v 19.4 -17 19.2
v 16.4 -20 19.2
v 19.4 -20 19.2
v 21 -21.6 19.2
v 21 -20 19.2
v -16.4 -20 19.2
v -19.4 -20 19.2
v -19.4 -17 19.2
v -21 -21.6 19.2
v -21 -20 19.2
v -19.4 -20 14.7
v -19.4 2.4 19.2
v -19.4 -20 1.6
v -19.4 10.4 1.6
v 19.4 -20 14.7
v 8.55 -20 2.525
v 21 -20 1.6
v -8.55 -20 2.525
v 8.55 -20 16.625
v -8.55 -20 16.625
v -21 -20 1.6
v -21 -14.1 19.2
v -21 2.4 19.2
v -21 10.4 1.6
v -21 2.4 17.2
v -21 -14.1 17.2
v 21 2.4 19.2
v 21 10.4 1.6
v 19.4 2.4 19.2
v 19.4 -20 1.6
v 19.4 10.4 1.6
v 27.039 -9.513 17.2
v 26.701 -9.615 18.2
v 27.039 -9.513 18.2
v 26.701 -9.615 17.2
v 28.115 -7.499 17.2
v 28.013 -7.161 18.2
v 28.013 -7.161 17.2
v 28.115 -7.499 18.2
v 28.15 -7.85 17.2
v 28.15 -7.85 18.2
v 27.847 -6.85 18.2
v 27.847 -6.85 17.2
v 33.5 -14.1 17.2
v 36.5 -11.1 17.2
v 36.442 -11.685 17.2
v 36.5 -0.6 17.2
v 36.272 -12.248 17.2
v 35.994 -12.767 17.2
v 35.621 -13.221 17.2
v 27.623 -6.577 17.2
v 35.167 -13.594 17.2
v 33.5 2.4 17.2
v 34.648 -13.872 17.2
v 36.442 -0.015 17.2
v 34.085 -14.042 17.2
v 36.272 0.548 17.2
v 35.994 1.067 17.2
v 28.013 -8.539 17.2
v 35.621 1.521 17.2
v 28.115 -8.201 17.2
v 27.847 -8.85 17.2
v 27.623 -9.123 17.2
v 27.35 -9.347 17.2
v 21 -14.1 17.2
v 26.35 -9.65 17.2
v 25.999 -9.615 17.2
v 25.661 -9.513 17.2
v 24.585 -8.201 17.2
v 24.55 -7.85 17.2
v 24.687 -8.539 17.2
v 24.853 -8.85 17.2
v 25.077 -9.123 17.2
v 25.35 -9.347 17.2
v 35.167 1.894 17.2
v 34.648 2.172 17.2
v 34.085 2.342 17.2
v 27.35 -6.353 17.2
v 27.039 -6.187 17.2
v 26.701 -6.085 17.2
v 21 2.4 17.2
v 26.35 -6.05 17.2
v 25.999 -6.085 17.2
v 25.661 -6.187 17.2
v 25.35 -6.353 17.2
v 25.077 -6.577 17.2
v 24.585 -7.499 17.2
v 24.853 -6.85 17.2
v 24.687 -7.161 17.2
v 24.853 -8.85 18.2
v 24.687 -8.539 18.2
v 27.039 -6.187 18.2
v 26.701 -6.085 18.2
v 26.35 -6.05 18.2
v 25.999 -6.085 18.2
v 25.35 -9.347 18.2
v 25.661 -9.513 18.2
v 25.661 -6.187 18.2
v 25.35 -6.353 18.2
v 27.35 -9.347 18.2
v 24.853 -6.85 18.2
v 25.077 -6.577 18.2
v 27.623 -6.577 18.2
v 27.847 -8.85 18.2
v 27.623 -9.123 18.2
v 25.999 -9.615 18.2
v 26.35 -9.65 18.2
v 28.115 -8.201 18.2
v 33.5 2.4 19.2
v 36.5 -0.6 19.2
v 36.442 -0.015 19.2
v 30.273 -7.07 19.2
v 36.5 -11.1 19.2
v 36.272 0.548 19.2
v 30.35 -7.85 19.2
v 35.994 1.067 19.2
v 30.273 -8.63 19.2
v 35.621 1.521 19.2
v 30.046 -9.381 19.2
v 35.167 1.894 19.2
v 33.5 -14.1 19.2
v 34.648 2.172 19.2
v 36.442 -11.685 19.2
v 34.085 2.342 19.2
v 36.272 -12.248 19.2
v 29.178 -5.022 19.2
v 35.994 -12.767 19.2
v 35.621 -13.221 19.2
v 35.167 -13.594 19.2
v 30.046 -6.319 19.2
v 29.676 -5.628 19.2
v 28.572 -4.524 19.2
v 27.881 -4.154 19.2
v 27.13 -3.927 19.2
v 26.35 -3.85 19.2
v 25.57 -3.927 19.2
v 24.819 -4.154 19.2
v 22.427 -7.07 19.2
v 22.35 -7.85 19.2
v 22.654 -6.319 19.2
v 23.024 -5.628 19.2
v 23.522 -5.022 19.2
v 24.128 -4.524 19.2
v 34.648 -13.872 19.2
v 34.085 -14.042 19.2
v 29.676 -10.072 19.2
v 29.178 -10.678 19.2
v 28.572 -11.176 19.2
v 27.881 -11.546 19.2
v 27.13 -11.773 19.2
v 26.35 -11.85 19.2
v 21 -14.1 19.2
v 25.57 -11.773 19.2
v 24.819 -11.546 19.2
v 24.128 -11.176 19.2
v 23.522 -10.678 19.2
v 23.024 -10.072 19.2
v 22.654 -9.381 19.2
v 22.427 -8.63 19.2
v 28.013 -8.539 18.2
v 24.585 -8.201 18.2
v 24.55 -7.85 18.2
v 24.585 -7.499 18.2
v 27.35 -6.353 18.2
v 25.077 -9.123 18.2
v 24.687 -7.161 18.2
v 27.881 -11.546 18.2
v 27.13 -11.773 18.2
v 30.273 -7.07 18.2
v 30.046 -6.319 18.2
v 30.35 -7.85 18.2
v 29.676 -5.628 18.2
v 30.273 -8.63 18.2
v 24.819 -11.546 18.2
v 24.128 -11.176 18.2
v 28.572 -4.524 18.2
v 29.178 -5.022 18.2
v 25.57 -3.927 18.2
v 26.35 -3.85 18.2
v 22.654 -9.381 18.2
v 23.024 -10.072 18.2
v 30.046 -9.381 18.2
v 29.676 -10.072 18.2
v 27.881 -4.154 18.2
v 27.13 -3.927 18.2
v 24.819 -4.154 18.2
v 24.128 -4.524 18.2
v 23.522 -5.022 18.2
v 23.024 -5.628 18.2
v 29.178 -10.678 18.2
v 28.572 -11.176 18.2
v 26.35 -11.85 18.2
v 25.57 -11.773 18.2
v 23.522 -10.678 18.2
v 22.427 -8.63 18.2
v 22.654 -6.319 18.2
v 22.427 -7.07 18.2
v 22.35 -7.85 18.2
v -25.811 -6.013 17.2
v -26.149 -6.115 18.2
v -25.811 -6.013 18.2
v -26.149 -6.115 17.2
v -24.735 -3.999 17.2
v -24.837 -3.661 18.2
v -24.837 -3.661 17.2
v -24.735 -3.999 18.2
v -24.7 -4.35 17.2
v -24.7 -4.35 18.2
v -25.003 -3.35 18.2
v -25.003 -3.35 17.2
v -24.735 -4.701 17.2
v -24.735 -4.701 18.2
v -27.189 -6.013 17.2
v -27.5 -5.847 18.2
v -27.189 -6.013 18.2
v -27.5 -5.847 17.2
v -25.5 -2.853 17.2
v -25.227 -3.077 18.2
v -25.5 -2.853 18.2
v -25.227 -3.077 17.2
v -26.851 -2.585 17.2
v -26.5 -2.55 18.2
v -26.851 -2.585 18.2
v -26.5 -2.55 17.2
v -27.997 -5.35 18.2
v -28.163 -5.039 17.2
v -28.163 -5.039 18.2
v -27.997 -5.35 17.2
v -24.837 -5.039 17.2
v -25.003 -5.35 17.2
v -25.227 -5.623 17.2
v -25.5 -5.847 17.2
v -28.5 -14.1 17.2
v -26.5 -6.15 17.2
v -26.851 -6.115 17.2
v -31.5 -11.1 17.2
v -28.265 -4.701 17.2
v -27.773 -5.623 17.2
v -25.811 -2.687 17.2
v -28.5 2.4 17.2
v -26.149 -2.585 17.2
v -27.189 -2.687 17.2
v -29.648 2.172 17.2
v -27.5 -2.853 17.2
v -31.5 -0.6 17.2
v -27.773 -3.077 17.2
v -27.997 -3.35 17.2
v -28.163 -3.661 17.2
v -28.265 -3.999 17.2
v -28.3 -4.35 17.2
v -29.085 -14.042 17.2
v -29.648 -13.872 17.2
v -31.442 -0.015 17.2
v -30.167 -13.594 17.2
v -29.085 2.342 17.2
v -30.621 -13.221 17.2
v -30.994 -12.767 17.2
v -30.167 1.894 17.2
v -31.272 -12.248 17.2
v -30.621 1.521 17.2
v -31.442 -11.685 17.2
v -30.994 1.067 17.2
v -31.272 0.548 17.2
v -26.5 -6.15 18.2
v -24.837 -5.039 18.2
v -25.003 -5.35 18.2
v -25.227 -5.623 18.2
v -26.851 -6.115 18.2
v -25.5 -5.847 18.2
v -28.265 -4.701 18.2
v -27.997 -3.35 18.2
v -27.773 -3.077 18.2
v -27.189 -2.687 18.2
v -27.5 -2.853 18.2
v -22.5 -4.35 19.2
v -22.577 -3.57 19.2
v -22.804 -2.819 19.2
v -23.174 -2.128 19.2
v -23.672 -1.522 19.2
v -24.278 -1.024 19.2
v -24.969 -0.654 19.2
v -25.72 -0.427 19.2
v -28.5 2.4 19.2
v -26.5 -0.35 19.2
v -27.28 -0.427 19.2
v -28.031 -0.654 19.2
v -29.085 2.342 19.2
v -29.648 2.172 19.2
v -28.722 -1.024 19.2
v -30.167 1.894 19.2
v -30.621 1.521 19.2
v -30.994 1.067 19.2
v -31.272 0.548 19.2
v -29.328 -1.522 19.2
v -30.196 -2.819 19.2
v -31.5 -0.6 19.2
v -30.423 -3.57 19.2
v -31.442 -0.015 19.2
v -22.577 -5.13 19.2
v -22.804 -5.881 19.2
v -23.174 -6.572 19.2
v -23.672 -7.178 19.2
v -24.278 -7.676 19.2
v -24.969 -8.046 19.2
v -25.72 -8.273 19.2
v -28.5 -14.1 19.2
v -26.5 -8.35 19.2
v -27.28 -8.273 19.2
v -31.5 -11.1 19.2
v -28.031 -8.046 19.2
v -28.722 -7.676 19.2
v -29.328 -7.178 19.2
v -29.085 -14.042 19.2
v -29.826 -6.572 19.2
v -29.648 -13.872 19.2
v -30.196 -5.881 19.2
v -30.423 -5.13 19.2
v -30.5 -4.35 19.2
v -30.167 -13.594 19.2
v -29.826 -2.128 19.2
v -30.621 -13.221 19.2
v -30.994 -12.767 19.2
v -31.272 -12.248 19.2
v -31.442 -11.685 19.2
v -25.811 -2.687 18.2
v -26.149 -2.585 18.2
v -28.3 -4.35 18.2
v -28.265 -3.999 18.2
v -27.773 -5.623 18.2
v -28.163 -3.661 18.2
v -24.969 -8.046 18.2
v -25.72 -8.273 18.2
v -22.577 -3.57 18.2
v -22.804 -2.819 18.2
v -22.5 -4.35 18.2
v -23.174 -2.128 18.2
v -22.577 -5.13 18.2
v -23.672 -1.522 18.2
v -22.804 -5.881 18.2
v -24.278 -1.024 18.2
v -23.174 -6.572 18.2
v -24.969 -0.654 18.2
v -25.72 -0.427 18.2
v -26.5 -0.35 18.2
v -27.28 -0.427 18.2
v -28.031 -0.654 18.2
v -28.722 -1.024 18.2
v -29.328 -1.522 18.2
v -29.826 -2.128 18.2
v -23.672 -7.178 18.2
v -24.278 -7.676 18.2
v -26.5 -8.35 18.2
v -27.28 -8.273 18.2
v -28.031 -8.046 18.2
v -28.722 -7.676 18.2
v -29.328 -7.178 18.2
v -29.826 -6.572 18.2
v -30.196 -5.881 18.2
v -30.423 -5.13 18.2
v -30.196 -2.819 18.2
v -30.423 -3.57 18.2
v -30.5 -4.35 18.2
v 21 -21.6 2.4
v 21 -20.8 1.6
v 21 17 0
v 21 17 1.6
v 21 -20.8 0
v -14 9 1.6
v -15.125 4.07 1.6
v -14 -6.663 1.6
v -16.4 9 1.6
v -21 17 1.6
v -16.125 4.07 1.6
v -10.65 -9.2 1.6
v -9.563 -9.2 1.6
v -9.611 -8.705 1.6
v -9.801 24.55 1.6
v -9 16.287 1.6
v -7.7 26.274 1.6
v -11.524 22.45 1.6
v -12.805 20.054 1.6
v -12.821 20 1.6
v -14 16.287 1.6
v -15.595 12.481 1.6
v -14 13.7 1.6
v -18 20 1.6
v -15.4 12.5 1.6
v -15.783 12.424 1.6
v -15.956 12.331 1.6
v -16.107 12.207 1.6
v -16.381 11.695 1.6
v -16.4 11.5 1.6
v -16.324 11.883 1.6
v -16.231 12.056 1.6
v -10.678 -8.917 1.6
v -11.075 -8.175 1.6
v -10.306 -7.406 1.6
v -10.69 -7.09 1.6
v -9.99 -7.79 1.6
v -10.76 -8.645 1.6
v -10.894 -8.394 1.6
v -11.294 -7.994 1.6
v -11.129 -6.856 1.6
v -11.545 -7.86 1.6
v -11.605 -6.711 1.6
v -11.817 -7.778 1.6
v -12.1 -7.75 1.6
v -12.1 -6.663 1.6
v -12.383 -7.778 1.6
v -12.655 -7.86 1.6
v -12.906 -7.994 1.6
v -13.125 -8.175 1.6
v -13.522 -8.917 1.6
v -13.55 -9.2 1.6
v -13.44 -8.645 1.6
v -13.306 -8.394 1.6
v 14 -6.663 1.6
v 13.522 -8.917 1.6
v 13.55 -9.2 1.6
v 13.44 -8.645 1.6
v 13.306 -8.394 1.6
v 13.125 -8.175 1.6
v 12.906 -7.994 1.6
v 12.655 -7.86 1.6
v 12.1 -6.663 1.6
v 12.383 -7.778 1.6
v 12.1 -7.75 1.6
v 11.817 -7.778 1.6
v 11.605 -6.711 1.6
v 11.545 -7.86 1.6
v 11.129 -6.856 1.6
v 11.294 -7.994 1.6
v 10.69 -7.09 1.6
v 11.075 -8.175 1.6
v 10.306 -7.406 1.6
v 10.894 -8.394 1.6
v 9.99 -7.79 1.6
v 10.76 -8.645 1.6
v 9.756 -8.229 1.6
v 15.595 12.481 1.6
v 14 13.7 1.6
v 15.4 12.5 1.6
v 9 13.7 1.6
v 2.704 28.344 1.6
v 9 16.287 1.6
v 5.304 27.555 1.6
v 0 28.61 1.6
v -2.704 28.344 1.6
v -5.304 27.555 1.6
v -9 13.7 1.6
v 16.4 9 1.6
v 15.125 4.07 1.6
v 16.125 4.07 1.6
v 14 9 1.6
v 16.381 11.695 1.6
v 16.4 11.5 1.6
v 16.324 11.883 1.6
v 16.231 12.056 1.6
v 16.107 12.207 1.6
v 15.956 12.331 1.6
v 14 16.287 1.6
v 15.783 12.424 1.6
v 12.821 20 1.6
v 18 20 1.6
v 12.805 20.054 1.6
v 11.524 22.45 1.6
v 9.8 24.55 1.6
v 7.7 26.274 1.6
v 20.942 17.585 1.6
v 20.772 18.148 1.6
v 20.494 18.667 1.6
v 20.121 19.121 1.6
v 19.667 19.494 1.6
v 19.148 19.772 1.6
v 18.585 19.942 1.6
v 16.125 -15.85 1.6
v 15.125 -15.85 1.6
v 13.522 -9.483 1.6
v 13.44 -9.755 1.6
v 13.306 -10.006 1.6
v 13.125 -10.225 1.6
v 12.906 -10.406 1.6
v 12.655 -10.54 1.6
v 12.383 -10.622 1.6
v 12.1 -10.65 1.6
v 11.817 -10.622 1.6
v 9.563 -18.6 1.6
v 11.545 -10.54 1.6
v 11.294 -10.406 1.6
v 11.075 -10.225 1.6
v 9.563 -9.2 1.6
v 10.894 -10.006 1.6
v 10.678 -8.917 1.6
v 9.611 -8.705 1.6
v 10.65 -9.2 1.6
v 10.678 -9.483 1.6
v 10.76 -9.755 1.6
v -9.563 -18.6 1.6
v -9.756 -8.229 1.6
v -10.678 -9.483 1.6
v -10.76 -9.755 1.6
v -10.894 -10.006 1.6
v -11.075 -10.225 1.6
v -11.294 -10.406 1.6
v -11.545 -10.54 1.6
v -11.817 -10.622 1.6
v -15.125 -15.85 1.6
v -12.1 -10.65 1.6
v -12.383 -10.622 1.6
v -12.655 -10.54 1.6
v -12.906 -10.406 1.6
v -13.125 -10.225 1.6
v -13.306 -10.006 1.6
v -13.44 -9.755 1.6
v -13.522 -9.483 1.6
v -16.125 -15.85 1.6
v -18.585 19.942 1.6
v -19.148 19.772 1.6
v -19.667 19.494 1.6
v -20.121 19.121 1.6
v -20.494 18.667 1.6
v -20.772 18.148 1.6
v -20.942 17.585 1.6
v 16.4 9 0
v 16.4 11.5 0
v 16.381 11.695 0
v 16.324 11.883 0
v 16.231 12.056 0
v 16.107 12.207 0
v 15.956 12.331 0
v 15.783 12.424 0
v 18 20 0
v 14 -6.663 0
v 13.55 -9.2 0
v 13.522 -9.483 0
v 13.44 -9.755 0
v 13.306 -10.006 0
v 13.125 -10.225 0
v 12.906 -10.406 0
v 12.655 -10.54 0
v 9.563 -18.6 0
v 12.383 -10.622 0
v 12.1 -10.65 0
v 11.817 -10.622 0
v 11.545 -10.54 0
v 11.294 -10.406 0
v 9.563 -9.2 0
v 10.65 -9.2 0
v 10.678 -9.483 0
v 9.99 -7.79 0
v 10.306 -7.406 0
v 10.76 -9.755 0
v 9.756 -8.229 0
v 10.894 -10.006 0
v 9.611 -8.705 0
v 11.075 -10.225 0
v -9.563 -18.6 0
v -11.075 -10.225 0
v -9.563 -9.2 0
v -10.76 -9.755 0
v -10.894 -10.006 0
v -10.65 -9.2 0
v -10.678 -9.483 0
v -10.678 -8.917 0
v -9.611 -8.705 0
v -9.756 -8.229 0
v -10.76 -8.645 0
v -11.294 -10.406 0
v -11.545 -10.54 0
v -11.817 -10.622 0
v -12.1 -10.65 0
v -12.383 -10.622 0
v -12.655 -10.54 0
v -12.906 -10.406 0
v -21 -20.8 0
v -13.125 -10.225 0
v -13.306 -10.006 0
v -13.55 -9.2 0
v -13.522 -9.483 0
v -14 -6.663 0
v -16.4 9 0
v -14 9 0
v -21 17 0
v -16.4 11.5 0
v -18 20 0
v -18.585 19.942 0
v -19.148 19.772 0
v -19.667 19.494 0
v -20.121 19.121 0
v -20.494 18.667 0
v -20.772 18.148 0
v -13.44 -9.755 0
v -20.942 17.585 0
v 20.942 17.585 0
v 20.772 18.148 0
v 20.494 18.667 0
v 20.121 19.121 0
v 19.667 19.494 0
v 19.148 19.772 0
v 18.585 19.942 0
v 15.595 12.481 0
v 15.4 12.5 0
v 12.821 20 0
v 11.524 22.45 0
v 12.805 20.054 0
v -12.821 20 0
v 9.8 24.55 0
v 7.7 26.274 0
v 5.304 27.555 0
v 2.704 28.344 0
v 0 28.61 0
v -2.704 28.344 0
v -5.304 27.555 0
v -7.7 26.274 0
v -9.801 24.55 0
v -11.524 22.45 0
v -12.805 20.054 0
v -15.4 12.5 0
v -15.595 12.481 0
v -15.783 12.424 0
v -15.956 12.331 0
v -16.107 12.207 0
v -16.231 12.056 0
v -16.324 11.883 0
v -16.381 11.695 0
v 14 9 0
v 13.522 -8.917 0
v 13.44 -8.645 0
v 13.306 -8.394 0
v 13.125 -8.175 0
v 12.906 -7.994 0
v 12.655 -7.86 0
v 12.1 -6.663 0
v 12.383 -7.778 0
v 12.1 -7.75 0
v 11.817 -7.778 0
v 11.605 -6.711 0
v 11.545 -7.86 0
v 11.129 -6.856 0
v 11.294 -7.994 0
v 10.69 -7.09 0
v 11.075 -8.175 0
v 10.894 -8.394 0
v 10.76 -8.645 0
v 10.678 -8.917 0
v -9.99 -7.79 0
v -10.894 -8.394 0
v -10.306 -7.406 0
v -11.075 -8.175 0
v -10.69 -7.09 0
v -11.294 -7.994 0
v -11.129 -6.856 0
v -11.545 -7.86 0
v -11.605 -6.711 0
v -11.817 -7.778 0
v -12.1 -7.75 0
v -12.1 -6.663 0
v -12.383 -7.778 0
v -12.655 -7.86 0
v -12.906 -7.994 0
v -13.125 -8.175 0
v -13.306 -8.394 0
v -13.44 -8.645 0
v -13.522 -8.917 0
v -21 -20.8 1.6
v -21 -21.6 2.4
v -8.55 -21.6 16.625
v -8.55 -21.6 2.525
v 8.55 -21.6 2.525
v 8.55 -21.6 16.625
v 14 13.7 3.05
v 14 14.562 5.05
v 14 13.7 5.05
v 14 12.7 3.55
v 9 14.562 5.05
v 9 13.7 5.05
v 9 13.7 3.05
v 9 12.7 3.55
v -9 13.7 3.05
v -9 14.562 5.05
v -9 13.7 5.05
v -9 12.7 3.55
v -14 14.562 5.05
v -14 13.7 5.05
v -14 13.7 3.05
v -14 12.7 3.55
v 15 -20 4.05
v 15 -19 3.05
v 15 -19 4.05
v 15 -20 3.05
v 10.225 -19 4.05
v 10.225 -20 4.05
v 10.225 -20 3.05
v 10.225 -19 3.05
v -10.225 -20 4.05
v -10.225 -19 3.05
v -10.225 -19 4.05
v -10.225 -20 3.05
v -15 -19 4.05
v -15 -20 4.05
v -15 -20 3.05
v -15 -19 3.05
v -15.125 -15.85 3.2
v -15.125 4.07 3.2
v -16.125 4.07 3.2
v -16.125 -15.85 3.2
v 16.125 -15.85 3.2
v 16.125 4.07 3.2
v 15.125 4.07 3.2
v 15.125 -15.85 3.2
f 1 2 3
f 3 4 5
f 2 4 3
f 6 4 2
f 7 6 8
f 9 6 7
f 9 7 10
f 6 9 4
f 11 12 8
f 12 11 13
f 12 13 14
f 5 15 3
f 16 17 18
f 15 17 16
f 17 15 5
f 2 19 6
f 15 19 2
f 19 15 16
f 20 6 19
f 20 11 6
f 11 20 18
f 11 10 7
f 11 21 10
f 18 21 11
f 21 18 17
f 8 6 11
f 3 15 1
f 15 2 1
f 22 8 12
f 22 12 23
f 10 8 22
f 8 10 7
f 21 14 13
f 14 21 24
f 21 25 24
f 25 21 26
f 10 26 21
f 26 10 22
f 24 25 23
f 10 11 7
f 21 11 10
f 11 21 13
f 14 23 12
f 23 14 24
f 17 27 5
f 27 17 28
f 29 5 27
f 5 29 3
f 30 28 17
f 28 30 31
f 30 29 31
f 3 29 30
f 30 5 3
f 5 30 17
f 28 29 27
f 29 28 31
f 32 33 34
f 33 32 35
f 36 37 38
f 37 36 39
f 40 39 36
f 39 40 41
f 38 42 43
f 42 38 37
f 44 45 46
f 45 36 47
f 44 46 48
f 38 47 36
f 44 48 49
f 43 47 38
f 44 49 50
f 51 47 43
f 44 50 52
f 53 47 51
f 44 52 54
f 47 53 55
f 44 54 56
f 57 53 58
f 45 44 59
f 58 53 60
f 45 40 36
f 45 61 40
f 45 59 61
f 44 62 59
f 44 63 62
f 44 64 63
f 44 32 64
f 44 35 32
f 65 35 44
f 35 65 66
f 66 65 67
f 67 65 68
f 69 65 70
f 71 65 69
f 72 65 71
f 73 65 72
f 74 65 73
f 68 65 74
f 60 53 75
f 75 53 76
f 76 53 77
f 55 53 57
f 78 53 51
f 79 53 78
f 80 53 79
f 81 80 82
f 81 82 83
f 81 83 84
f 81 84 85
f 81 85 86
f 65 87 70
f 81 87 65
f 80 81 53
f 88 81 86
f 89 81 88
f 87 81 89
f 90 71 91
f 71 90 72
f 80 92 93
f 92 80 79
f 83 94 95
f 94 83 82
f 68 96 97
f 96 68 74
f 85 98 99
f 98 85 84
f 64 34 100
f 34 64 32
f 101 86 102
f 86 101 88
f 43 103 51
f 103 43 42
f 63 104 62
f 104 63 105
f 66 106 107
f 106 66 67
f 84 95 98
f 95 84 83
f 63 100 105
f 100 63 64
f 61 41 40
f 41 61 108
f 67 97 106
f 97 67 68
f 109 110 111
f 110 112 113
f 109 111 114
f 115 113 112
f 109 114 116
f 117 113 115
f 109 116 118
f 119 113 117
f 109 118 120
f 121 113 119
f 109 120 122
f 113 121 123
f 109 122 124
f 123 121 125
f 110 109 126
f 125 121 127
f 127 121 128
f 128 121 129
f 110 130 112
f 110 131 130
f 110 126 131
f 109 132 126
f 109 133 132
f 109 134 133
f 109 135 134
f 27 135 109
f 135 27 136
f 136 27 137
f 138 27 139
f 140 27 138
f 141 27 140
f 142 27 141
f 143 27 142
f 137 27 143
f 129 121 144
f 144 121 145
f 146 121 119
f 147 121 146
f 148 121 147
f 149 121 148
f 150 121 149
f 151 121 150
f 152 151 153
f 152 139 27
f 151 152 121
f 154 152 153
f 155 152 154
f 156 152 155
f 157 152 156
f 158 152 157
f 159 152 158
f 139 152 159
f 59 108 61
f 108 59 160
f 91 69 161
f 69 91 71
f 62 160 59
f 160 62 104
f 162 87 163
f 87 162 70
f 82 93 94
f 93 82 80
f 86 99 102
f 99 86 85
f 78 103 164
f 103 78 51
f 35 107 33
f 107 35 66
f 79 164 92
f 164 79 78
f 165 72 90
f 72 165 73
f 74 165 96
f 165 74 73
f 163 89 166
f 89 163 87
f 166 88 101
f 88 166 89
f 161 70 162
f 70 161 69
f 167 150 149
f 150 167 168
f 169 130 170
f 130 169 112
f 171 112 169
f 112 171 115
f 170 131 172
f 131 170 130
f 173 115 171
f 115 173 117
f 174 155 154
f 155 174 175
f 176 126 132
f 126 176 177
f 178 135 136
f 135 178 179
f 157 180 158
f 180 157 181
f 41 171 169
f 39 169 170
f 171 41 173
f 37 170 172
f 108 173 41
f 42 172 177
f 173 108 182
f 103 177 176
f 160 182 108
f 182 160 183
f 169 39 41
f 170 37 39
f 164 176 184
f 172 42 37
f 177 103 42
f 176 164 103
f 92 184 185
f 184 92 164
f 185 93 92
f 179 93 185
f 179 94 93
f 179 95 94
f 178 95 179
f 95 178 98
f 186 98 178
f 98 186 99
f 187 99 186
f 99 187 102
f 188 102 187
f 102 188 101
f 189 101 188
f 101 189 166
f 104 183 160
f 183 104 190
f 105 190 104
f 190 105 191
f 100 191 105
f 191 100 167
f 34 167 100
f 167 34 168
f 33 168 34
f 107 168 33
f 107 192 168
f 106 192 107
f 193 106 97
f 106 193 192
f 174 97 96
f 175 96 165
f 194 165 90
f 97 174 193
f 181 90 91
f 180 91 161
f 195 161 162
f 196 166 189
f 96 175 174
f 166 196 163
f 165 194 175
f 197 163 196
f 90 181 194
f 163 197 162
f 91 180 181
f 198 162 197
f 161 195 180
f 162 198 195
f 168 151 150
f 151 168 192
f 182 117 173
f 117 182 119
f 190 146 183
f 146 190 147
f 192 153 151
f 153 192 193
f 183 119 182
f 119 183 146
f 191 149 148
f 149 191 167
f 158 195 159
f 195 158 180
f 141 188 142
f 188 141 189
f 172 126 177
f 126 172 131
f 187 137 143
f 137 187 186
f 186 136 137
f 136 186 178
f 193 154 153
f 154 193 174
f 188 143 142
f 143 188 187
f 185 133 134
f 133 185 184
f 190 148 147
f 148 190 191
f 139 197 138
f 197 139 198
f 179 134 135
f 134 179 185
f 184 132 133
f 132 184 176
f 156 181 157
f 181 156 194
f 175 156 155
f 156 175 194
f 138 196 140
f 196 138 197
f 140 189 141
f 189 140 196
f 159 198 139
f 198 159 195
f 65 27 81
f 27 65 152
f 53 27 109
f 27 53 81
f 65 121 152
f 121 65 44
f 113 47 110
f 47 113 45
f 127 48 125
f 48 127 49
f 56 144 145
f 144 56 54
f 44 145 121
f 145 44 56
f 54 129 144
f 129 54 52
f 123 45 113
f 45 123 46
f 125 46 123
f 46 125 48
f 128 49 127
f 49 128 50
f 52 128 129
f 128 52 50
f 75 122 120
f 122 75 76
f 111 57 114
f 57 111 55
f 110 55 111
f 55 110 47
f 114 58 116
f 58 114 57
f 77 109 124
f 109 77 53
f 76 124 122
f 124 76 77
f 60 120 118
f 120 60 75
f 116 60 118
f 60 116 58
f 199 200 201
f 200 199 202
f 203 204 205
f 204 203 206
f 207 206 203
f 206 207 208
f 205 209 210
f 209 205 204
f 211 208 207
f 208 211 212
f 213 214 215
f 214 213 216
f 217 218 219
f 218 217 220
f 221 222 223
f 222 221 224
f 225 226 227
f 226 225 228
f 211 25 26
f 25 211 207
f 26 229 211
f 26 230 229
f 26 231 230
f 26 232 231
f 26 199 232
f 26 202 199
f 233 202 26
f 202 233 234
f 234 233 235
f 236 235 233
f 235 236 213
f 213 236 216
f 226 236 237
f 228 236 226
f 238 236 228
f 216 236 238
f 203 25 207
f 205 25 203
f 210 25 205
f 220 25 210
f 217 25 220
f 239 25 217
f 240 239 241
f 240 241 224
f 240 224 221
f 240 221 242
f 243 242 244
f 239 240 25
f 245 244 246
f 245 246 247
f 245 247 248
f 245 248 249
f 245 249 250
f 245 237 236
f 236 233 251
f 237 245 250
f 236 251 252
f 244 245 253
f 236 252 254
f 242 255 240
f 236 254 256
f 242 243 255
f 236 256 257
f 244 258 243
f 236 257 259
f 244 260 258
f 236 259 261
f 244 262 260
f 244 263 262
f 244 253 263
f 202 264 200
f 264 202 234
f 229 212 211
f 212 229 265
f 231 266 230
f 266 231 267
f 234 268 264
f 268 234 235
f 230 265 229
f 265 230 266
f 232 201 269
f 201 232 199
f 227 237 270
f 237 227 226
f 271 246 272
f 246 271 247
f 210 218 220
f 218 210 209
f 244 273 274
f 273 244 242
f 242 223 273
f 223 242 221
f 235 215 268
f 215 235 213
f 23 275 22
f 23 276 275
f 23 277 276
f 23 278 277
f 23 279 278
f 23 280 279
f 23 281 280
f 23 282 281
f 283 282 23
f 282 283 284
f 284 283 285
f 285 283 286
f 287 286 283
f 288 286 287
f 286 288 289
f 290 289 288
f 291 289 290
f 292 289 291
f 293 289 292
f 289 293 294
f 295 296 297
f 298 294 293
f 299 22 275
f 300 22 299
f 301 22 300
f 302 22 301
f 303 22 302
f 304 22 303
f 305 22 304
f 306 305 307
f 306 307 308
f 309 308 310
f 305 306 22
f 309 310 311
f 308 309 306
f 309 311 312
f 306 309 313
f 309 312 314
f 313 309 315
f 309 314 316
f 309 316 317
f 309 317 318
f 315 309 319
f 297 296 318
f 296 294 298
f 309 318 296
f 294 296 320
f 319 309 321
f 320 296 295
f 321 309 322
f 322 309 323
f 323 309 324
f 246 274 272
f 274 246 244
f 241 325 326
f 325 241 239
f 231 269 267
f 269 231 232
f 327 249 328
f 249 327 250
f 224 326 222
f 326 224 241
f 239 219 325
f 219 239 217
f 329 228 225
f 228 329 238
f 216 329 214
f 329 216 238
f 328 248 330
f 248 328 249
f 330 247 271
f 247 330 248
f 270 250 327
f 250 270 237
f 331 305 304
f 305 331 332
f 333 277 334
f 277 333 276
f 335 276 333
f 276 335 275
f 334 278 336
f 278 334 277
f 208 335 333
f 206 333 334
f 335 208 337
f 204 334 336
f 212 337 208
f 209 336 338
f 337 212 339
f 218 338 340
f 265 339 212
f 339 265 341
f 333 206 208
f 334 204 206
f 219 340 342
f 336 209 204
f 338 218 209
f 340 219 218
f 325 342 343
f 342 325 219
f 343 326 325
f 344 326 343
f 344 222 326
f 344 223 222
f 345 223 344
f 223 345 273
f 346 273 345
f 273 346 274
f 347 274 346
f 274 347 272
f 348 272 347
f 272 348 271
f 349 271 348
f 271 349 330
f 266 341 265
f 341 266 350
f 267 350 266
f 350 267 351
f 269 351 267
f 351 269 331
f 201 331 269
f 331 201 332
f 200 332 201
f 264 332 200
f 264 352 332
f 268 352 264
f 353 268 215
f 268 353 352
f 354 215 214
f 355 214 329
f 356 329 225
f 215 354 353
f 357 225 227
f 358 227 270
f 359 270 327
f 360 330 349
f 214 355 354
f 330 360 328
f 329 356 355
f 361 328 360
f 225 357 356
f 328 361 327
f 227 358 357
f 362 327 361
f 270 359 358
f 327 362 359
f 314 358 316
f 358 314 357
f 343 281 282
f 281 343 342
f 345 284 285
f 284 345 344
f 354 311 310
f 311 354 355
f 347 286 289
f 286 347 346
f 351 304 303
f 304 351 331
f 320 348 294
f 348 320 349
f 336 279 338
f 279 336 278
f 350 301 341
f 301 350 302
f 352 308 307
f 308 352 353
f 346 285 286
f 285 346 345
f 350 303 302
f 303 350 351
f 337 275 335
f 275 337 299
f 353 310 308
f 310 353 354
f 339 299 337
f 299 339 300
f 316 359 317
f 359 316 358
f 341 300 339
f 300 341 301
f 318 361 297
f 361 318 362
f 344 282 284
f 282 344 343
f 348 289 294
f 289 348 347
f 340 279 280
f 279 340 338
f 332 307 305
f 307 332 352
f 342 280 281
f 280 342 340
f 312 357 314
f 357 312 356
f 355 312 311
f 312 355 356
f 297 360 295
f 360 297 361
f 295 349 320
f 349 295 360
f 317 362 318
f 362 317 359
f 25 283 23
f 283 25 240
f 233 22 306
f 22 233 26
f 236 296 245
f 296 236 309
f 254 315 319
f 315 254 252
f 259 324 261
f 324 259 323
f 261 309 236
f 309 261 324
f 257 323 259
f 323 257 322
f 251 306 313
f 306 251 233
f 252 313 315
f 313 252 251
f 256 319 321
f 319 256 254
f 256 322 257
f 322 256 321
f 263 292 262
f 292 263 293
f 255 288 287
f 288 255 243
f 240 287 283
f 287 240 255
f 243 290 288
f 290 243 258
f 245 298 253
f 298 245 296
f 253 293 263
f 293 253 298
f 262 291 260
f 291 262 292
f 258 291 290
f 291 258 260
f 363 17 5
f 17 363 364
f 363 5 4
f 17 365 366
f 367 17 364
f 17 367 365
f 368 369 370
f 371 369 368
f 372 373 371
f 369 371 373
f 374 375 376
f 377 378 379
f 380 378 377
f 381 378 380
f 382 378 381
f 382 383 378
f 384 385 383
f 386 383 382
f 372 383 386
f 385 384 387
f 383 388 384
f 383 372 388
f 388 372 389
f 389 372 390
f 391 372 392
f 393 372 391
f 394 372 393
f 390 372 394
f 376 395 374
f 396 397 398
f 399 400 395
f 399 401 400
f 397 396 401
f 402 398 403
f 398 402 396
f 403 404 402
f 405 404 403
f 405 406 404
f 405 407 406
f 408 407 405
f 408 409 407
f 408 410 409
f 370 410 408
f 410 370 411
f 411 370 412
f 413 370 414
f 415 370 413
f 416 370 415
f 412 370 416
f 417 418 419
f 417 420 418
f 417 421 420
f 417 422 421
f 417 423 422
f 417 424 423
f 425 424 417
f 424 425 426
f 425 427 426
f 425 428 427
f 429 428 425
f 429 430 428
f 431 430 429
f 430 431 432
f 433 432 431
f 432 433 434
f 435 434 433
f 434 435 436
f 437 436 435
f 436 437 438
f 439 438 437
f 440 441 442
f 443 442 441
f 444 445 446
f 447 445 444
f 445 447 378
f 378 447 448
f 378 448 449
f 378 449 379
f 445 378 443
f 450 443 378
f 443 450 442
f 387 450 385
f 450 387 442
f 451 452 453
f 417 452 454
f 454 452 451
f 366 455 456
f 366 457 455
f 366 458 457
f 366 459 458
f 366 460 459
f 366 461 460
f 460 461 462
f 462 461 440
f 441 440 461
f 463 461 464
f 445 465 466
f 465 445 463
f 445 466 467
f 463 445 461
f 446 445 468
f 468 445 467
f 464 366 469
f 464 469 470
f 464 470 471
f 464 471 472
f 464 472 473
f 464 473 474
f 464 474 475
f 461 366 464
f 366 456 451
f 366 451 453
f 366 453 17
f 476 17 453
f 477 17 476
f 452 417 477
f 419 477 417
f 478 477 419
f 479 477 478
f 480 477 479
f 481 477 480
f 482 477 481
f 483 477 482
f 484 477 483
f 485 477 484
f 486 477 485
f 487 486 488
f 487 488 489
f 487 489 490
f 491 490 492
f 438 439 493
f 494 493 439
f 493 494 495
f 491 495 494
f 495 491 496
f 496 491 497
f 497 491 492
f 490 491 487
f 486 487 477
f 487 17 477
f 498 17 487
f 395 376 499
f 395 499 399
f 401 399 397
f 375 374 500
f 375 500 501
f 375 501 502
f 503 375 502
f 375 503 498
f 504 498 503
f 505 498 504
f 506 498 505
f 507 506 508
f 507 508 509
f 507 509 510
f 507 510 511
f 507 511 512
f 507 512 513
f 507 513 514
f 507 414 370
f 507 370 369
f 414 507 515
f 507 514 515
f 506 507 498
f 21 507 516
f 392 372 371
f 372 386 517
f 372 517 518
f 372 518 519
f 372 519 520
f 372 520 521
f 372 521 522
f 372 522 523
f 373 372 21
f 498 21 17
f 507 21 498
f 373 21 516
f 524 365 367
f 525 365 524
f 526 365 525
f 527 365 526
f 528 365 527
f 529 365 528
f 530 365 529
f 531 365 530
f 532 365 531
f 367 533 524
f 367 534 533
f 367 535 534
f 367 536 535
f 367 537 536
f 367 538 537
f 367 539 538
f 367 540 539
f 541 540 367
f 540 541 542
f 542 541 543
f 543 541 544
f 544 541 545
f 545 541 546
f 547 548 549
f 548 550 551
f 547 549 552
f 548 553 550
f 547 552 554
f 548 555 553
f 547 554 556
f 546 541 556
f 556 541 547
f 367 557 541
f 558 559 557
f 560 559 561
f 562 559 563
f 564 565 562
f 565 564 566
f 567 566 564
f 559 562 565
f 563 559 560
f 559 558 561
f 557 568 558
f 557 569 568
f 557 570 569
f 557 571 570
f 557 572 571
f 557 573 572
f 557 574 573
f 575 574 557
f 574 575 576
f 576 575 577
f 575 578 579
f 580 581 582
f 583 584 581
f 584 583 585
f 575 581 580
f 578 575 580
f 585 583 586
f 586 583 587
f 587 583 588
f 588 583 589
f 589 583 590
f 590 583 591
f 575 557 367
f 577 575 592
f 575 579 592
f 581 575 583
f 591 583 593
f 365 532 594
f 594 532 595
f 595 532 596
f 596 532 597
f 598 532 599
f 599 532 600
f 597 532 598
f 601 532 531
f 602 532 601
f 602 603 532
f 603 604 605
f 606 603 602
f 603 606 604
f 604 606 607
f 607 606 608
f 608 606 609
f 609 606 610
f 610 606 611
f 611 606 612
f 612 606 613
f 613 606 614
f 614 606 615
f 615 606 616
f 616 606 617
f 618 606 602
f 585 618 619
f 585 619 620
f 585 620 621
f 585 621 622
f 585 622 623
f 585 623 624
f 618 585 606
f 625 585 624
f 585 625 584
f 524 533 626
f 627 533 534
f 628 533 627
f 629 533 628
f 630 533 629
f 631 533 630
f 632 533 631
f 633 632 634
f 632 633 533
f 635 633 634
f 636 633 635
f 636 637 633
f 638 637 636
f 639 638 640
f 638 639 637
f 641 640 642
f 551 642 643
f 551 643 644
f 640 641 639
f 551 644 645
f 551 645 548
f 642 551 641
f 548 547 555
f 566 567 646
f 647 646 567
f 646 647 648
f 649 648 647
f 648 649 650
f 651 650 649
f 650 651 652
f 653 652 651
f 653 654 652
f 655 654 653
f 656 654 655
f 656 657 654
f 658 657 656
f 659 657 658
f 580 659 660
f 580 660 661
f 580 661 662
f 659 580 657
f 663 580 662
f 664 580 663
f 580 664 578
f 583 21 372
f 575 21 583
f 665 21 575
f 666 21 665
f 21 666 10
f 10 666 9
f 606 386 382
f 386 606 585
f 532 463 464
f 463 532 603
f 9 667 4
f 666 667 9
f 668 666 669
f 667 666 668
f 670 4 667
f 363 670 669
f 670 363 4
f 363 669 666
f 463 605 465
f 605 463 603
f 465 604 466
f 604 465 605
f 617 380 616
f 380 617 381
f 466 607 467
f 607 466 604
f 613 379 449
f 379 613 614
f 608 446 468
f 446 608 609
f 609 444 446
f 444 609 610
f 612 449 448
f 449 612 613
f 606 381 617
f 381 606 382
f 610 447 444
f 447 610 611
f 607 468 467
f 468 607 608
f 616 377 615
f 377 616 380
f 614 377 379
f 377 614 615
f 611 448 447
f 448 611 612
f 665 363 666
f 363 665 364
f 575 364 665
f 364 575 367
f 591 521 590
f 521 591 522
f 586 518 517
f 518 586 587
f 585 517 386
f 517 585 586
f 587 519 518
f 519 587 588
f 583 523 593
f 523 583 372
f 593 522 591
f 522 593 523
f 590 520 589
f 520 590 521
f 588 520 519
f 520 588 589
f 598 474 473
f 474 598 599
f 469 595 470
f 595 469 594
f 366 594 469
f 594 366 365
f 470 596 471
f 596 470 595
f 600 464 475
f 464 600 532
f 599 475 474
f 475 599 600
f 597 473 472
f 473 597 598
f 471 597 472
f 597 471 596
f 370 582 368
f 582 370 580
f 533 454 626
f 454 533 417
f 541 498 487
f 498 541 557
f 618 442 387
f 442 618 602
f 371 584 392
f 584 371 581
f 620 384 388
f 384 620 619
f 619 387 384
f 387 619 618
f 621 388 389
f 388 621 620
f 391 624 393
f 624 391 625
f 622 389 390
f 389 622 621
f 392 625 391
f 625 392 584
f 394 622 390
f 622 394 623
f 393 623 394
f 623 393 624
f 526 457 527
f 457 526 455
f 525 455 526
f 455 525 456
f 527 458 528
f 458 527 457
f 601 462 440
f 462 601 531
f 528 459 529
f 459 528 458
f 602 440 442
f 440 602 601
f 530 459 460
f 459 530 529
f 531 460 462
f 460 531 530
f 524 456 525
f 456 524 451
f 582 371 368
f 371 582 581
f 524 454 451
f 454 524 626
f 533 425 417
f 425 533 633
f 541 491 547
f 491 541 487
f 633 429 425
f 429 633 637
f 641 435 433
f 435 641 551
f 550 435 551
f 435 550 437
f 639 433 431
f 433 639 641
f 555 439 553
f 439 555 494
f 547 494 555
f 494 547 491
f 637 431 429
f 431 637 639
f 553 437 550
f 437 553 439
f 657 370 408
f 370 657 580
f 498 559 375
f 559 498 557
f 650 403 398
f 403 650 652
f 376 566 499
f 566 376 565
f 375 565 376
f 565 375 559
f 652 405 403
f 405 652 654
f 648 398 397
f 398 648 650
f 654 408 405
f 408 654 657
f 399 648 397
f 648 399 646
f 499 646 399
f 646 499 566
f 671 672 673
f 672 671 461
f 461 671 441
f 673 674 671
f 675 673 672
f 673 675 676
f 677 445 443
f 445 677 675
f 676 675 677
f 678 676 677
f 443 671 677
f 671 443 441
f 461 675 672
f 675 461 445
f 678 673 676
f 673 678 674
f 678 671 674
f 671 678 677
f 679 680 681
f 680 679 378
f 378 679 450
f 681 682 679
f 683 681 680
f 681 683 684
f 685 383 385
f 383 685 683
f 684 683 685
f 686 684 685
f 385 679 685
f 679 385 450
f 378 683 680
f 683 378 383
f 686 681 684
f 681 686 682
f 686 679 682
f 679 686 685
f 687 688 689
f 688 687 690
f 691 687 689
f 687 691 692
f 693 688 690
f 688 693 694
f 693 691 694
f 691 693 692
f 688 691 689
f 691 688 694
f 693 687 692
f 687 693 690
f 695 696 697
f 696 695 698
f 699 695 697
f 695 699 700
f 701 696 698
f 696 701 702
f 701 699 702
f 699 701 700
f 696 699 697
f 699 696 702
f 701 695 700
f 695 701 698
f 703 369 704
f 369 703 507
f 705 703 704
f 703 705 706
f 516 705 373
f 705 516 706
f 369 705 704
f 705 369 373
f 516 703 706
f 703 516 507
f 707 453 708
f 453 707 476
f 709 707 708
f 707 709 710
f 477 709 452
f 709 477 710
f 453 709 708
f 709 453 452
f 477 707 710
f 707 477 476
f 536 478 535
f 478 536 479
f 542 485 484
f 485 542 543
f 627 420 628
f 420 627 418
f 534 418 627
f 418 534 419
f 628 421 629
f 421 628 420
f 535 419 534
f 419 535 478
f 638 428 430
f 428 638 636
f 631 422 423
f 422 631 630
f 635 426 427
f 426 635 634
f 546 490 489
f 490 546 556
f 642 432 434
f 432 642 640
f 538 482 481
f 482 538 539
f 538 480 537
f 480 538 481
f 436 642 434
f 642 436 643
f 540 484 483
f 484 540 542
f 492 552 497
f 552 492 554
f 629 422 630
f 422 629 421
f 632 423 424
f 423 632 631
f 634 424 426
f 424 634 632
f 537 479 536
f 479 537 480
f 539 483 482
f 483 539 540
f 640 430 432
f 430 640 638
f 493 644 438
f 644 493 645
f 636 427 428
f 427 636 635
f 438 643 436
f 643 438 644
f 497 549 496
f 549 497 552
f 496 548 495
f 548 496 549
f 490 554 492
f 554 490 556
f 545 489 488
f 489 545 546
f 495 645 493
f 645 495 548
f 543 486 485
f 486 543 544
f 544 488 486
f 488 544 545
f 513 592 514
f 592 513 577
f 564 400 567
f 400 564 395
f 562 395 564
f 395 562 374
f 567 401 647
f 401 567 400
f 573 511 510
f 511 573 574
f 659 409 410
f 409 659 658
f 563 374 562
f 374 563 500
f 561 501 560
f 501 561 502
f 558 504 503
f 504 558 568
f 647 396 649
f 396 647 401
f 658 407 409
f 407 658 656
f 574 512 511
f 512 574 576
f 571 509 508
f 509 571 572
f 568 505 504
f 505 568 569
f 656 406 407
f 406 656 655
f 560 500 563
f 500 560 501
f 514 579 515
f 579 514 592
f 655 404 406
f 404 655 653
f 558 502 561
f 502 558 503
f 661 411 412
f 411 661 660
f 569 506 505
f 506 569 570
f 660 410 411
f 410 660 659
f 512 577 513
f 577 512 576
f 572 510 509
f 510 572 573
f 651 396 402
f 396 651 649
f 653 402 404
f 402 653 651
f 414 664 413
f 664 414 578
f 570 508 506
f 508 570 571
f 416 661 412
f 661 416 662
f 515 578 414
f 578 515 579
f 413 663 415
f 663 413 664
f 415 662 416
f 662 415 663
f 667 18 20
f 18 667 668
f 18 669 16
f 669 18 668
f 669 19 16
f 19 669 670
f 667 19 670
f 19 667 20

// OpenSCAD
// file: hash.scad
//
// Copyright (c) Stewart H. Whitman, 2020-2021.
//
// File:    hash.scad
// Project: General
// License: CC BY-NC-SA 4.0 (Attribution-NonCommercial-ShareAlike)
// Desc:    Implementation of a hash associative array.
//

// hash can be initialized like:
//
//   config = hash_add( hash_add( hash_add( hash_add( hash_initialize(), "first_name", "Bob" ), "last_name", "Doe" ), "age", 50 ), "kids", [ "Jane", "John" ] );
//
// or perhaps more simply like:
//
//   config = [
//     [ "first_name", "Bob" ],
//     [ "last_name", "Doe" ],
//     [ "age", 50 ],
//     [ "kids", [ "Jane", "John" ] ],
//   ];
//
// Then values can be retrieved by:
//
//   echo( hash_get( config, "first_name" ) ); // -> "Bob"
//
// Default values can be obtained as follows if the key is missing from the hash:
//
//   echo( hash_get_default( config, "age", 0 ) ); // -> 50
//   echo( hash_get_default( config, "occupation", "unknown" ) ); // -> "unknown"
//
// Or, you can have an entire hash of default values to fallback on:
//
//   default_config = [
//     [ "first_name", "none" ],
//     [ "last_name", "none" ],
//     [ "age", -1 ],
//     [ "occupation", "unknown" ],
//     [ "kids", [] ],
//   ];
//
//   echo( hash_get_default_hash( config, "age", default_config ) ); // -> 50
//   echo( hash_get_default_hash( config, "occupation", default_config ) ); // -> "unknown"
//
// Functions like 'hash_set' and 'hash_delete' require you to assign the returned result
// to a new variable, since openscad does not have true variables.
//
//   anon_config = hash_delete( hash_delete( config, "first_name" ), "last_name" );
//   echo( hash_exists( anon_config, "first_name" ) ); // -> false
//
// Most of the other functions are obvious.
//

// hash_initialize:
//
// Returns initialization of a hash.
//
function hash_initialize() = [];

// hash_add:
//
// Adds <key>:<value> to <hash>. This does not check for duplicates. Use hash_set to remove duplicates.
//
function hash_add( hash, key, value ) = assert( is_list(hash) ) is_undef(key) ? hash : concat( hash, [[key, value]] );

// hash_size:
//
// Returns the size of <hash>.
//
function hash_size( hash ) = assert( is_list(hash) ) len(hash);

// hash_is_empty:
//
// Returns true if <hash> is empty.
//
function hash_is_empty( hash ) = assert( is_list(hash) ) len(hash) == 0;

// hash_keys:
//
// Return the keys of <hash> in an array.
//
function hash_keys( hash ) = assert( is_list(hash) ) [ for( i = hash ) i[0] ];

// hash_values:
//
// Return the values of <hash> in an array.
//
function hash_values( hash ) = assert( is_list(hash) ) [ for( i = hash ) i[1] ];

// hash_get:
//
// Returns the value associated with key <key> from <hash> or undef if it does not exist.
//
function hash_get( hash, key ) = assert( is_list(hash) ) hash[ search( [key], hash, 1, 0 )[0] ][1];

// hash_exists:
//
// Returns true if the key <key> exists in <hash>.
//
function hash_exists( hash, key ) = assert( is_list(hash) ) search( [key], hash, 1, 0 ) != [[]];

// hash_get_default:
//
// Returns the value associated with key <key> from <hash> or <default_value> if it does not exist.
//
function hash_get_default( hash, key, default_value ) = hash_exists( hash, key ) ? hash_get( hash, key ) : default_value;

// hash_get_default_hash:
//
// Returns the value associated with key <key> from <hash>, falling back to <default_hash> if it does not exist.
//
function hash_get_default_hash( hash, key, default_hash ) = hash_exists( hash, key ) ? hash_get( hash, key ) : hash_get( default_hash, key );

// hash_delete:
//
// Deletes key <key> from <hash> if it exists and returns the new hash.
//
function hash_delete( hash, key ) = assert( is_list(hash) ) [ for( i = hash ) if( key != i[0] ) i ];

// hash_set:
//
// Set key <key> to associated <value> in <hash>, deleting it if it already exists,  and returns the new hash.
//
function hash_set( hash, key, value ) = hash_exists( hash, key ) ? hash_add( hash_delete( hash, key ), key, value ) : hash_add( hash, key, value );
// file: primitives.scad
//
// Copyright (c) Stewart H. Whitman, 2020-2021.
//
// File:    primitives.scad
// Project: Dell Wyse 5070 2nd Ethernet Adapter Adapter
// License: CC BY-NC-SA 4.0 (Attribution-NonCommercial-ShareAlike)
// Desc:    Shape primitives
//
// $Header$
//

include <smidge.scad>;

// Creates a right triangle with <height> and <base> and extrudes it
// to <thickness>.
//
module right_triangle(height, base, thickness) {
  translate( [+thickness,0,0] ) rotate( [0,-90,0] ) linear_extrude( height=thickness ) polygon( [[0,0], [0,height], [base,0]] );
} // end right_triangle

// Create a half cylinder
module half_cylinder(r,h,center=false) {
  translate( [center ? -h/2 : 0, 0, 0] )
    rotate( [90,0,0] ) rotate( [0,90,0] )
    difference() {
      cylinder( r=r, h=h );
      translate( [-2*r,-r, -SMIDGE ] ) cube( [ 2*r,2*r,h+2*SMIDGE] );
    }
} // end half_cylinder

// Create a triangle with 2 sides the same
module equi_triangle(height_and_base, thickness,center=false) {
  translate( [ center ? -thickness/2 : 0, 0, 0 ] ) {
    right_triangle(height_and_base, height_and_base, thickness);
    mirror( [0,0,1] ) right_triangle(height_and_base, height_and_base, thickness);
  }
} // end equi_triangle

// Create a somewhat complex tang (a right triangle over a cube)
module tang(l,h,w,percent=25,center=false) {
  assert( percent > 0 && percent < 100 );
  //echo( ["tang",l,w,h,percent] );

  p = percent/100;

  translate( [-w/2,0,center?-h/2 : 0] ) {
    translate( [0,0,p*h] )
      right_triangle(l,(1-p)*h,w);
    cube( [w,l,p*h] );
  }
} // end tang

// Create a somewhat complex tang (a right triangle over another triangle)
module tang2(l,h,w,percent=25,center=false) {
  assert( percent > 0 && percent < 100 );
  //echo( ["tang2",l,h,w,percent] );

  p = percent/100;

  translate( [-w/2,0,center?-h/2 : 0] ) {
    translate( [0,0,p*h] )
      right_triangle(l,(1-p)*h,w);
    translate( [0,0,p*h] )
      mirror( [0,0,1] ) right_triangle(l,p*h,w);
  }
} // end tang2

// Create a gusset (pyramid that fits in corner)
module gusset(width,height=0,center=true) {
  w = width;
  h = height == 0 ? w : height;
  translate( [0,0,center?-h/2:0] )
    polyhedron( points=[[0,0,0], [w,0,h], [0,0,h], [0,w,h]],
                faces=[[1,2,3],[0,1,3],[0,2,1],[0,3,2]] );
} // end gusset

// A corner rounding shape for a designated corner (on the XY plane)...
module round_corner_xy(radius,v,direction) {
  assert( direction >= 0 && direction <= 3 );

  if( radius > 0 ) {
    // Additional amount on Z
    z_multiplier = 2;
    z_translate  = [ [-1, -1, 0], [+1, -1, 0], [+1, +1, 0], [-1, +1, 0] ];

    // Get an inverted quarter pie slice
    color( "purple" )
    translate( [v.x,v.y,0] )
      translate( z_translate[direction]*radius )
	rotate( [0,0,90*direction] )
	  difference() {
	    translate( [0,0,-v.z*z_multiplier/4] ) cube( [radius+SMIDGE,radius+SMIDGE,v.z*z_multiplier] );
	    translate( [0,0,v.z*z_multiplier/4] ) cylinder( v.z*z_multiplier+SMIDGE, r=radius, center=true );
	  }
  }
} // end round_corner_xy

// A corner rounding shape for a designated corner (on the YZ plane)...
module round_corner_yz(radius,v,direction) {
  assert( direction >= 0 && direction <= 3 );

  if( radius > 0 ) {
    // Additional amount on X
    x_multiplier = 2;
    x_translate  = [ [0, -1, +1], [0, -1, -1], [0, +1, -1], [0, +1, +1] ];

    // Get an inverted quarter pie slice
    color( "purple" )
      translate( [0,v.y,v.z] )
	translate( x_translate[direction]*radius )
	  rotate( [90*direction,0,0] )
	  rotate( [0,90,0] )
	    difference() {
	      translate( [0,0,-v.x*x_multiplier/4] ) cube( [radius+SMIDGE,radius+SMIDGE,v.x*x_multiplier] );
	      translate( [0,0,v.x*x_multiplier/4] ) cylinder( v.x*x_multiplier+SMIDGE, r=radius, center=true );
	    }
  }
} // end round_corner_yz

// A corner rounding shape for a designated corner (on the XZ plane)...
module round_corner_xz(radius,v,direction) {
  assert( direction >= 0 && direction <= 3 );

  if( radius > 0 ) {
    // Additional amount on Y
    y_multiplier = 2;
    y_translate  = [ [-1, 0, -1], [-1, 0, +1], [+1, 0, +1], [+1, 0, -1] ];

    // Get an inverted quarter pie slice
    color( "purple" )
      translate( [v.x,0,v.z] )
	translate( y_translate[direction]*radius )
	  rotate( [0,90*direction,0] )
	  rotate( [90,0,0] )
	    difference() {
	      translate( [0,0,-v.y*y_multiplier/4] ) cube( [radius+SMIDGE,radius+SMIDGE,v.y*y_multiplier] );
	      translate( [0,0,v.y*y_multiplier/4] ) cylinder( v.y*y_multiplier+SMIDGE, r=radius, center=true );
	    }
  }
} // end round_corner_xz
// file: smidge.scad
//
// Copyright (c) Stewart H. Whitman, 2020-2021.
//
// File:    smidge.scad
// Project: General
// License: CC BY-NC-SA 4.0 (Attribution-NonCommercial-ShareAlike)
// Desc:    SMIDGE constant used in preview mode.
//

// Smidge constant for rendering only (to avoid Z-axis fighting, etc.)
SMIDGE = $preview ? 0.01 : 0;
// file: youyeetoo-nic.scad
//
// Copyright (c) Stewart H. Whitman, 2024.
//
// File:    youyeetoo-nic.scad
// Project: Dell Wyse 5070 2nd Ethernet Adapter Adapter
// License: CC BY-NC-SA 4.0 (Attribution-NonCommercial-ShareAlike)
// Desc:    Mock-up of the Youyeetoo Intel i225V B3/i226 M.2 NIC
//

include <smidge.scad>;

// Youyeetoo Intel I225-V B3/I226 M.2 Daughter board layout
// Part #: IIO-ALAN4 (M.2 A+E Key 2230)
//
// N.B.: Based on various pictures, there are at least two
// different daughter boards associated with this NIC/Part:
//   - a Pulse chip + black shield /w small holes deeper on PCB
//   - a Fuwin chip + silver shield /w larger holes shallower on PCB
// This file matches the layout of the one with the Pulse chip.
//
// This NIC is an M.2 A+E 2230 with a Intel I225V/I226 2.5GB NIC
// and a daughter board connected by a small cable. The cable is
// available in various lengths from 10cm to 30cm; I used a 15cm
// cable for the Wyse 5070.
//
// It is available from the Youyeetoo store:
//   https://www.youyeetoo.com/products/25g-m2-ethernet-card?VariantsId=12274
// or Aliexpress:
//   https://www.aliexpress.com/item/3256807086898768.html
// And made for one of their SBCs.
//
// Most of values come from the measurements available
// on their site - missing items were measured. The
// components/holes are symmetric about the Y-axis (side<->side),
// so some values are calculated accordingly.
//
// The shield holes match the layout of DE-9/DE-15 (9-pin
// serial or 15-pin vga) connector, and in fact it can be
// mounted in a serial or VGA cutout with the supplied hardware.
//

// kind:
//
// Unique, for customization.
//
function nic_kind() = "youyeetoo";

// pcb thickness ~1.0mm
// pcb length (measured) X width (measured)
function nic_get_pcb_size() = [ 30, 33.2, 1.0 ];

// ethernet size [left<->right,front<->rear,top<->bottom]
// Close match: Kycon, Inc. GWLX-SMT-S988G/Y
//              https://www.digikey.com/en/products/detail/kycon-inc/GWLX-SMT-S988G-Y/10248051
// Height x Width: Drawing says 17.2x13.9 (maybe includes EMI fingers), measured about 16.5x13.5 (excluding EMI fingers)
function nic_get_ethernet_size() = [16.5,16,13.5];

// shield: thickness (including bend radius)
function nic_get_shield_thickness() = 1.8;
// shield: size
function nic_get_shield_size() = [ nic_get_pcb_size().x, nic_get_shield_thickness(), nic_get_ethernet_size().z ];
// shield hole position (25mm apart per DE-9 standard) [ left=0, bottom of pcb=0]
function _nic_get_shield_left_hole() = [ nic_get_shield_size().x/2-12.5, 7.0+nic_get_pcb_size().z ];
function _nic_get_shield_right_hole() = [ nic_get_shield_size().x/2+12.5, 7.0+nic_get_pcb_size().z ];
function nic_get_shield_holes() = [ _nic_get_shield_left_hole(), _nic_get_shield_right_hole() ];
// shield hole diameter (measures about 2.8mm)
function nic_get_shield_hole_diameter() = 2.8;
function nic_get_shield_z() = nic_get_pcb_size().z;
function nic_get_shield_center_pos() = [ nic_get_pcb_size().x/2, nic_get_shield_size().z/2+nic_get_shield_z() ];

// ethernet position is equidistant from left or right side
function _nic_get_ethernet_left_pos() = (nic_get_pcb_size().x - nic_get_ethernet_size().x)/2;
function _nic_get_ethernet_right_pos() = (nic_get_pcb_size().x + nic_get_ethernet_size().x)/2;
// N.B.... about 0.0mm between ethernet and PCB
function _nic_get_ethernet_bottom_pos() = nic_get_pcb_size().z + 0.0;
function nic_get_ethernet_center_pos() = [ (_nic_get_ethernet_left_pos()+_nic_get_ethernet_right_pos())/2, _nic_get_ethernet_bottom_pos() + nic_get_ethernet_size().z/2 ];
function nic_get_ethernet_projection() = 12.75-10.5;

// bottom hole positions [left=0, rear=0] - equidistant from both sides
function _nic_get_left_hole() = [ nic_get_pcb_size().x/2 - 24.2/2, nic_get_pcb_size().y - 10.8];
function _nic_get_right_hole() = [ nic_get_pcb_size().x/2 + 24.2/2, nic_get_pcb_size().y - 10.8];
function nic_get_bottom_holes() = [ _nic_get_left_hole(), _nic_get_right_hole() ];
// bottom hole diameter (measures about 2.5mm, diagram says 2mm - screw size)
function nic_get_bottom_hole_diameter() = 2.5;

// Layout of the nic board (PCB centered with NIC port hanging out)
module nic(transparency=1.0,center=true,with_shield=true) {
  shield_thickness = nic_get_shield_thickness();

  module hole(height,diameter) {
    translate( [0,0,-SMIDGE] ) cylinder( h = height+2*SMIDGE, d=diameter );
  } // end hole

  // pcb
  module pcb() {
    color( "green", transparency ) cube( nic_get_pcb_size() );
  } // end pcb

  // ethernet
  module ethernet() {
    // connector
    color( "silver", transparency )
      translate( [_nic_get_ethernet_left_pos(), nic_get_pcb_size().y-nic_get_ethernet_size().y+nic_get_ethernet_projection(), _nic_get_ethernet_bottom_pos()] )
        cube( nic_get_ethernet_size() );
    // nubs securing connector below bottom
    color( "black", transparency ) {
      h = _nic_get_ethernet_bottom_pos()+0.2;
      translate( [_nic_get_ethernet_left_pos()+1.8,nic_get_pcb_size().y-3.4,_nic_get_ethernet_bottom_pos()-h] ) cylinder( h=h, d=3.00 );
      translate( [_nic_get_ethernet_right_pos()-1.8,nic_get_pcb_size().y-3.4,_nic_get_ethernet_bottom_pos()-h] ) cylinder( h=h, d=3.00 );
    }
  } // end ethernet

  // shield
  module shield() {
    shield_holder    = [ 6.4, 0.2+nic_get_ethernet_size().y-nic_get_ethernet_projection(), shield_thickness ];
    shield_left_pos  = [ (nic_get_pcb_size().x-nic_get_shield_size().x)/2, nic_get_pcb_size().y, nic_get_shield_z() ];
    shield_right_pos = [ shield_left_pos.x+nic_get_shield_size().x, nic_get_pcb_size().y, nic_get_shield_z() ];
    color( "black", transparency )
      difference() {
	 union() {
	    translate( shield_left_pos ) cube( nic_get_shield_size() );
	    translate( shield_left_pos-[0,shield_holder.y,0] ) cube( shield_holder );
	    translate( shield_right_pos-[shield_holder.x,shield_holder.y,0] ) cube( shield_holder );
	  }
	// Cutout ethernet hole...
	o = 0.2;
	translate( [_nic_get_ethernet_left_pos()-o,nic_get_pcb_size().y-nic_get_ethernet_size().y+nic_get_ethernet_projection(),_nic_get_ethernet_bottom_pos()-o] )
	  cube( nic_get_ethernet_size() + 2*[o,o,o] );
      }
  } // end shield

  // header_ja: wiring connector
  module header_ja() {
    // 12-pin @ about 1mm pitch
    header_size = [ 14.4, 4.2, 2.8 ];
    color( "white", transparency )
      translate( [ nic_get_pcb_size().x/2 - header_size.x/2, 0, nic_get_pcb_size().z ] ) cube( header_size );
  } // end header_ja

  // mags: Pulse H5084NL chip
  module mags() {
    mag_size = [ 15.2, 7.6, 4.1+nic_get_pcb_size().z ];
    color( "black", transparency )
      translate( [ nic_get_pcb_size().x/2 - mag_size.x/2, 9, +0.2 ] ) cube( mag_size );
  } // end mags

  // entire nic
  translate( center ? -[nic_get_pcb_size().x,nic_get_pcb_size().y,0]/2 : [0,0,0] ) {
    difference() {
      union() {
	pcb();
	ethernet();
	header_ja();
	mags();

        if( with_shield )
	  shield();
      }

      // Bottom Holes (left and right)
      for( h = nic_get_bottom_holes() )
	translate( concat( h, -shield_thickness ) ) hole( nic_get_pcb_size().z + 2*shield_thickness, nic_get_bottom_hole_diameter() );

      // Vertical Holes (left and right)
      if( with_shield )
	for( h = nic_get_shield_holes() )
	  translate( [h.x, nic_get_pcb_size().y + shield_thickness, h.y] ) rotate( [90,0,0] ) hole( shield_thickness, nic_get_shield_hole_diameter() );
    }
  }
} // end nic

nic($fn=24);
// main file
//
// Copyright (c) Stewart H. Whitman, 2024.
//
// File:    wyse-youyeetoo-adapter.scad
// Project: Dell Wyse 5070 2nd Ethernet Adapter Adapter
// License: CC BY-NC-SA 4.0 (Attribution-NonCommercial-ShareAlike)
// Desc:    Adapter that holds Youyeetoo (IIO-ALAN4 M.2 A+E Key 2230) NIC Daughter-board
//

use <youyeetoo-nic.scad>
include <wyse-ethernet.scad>
